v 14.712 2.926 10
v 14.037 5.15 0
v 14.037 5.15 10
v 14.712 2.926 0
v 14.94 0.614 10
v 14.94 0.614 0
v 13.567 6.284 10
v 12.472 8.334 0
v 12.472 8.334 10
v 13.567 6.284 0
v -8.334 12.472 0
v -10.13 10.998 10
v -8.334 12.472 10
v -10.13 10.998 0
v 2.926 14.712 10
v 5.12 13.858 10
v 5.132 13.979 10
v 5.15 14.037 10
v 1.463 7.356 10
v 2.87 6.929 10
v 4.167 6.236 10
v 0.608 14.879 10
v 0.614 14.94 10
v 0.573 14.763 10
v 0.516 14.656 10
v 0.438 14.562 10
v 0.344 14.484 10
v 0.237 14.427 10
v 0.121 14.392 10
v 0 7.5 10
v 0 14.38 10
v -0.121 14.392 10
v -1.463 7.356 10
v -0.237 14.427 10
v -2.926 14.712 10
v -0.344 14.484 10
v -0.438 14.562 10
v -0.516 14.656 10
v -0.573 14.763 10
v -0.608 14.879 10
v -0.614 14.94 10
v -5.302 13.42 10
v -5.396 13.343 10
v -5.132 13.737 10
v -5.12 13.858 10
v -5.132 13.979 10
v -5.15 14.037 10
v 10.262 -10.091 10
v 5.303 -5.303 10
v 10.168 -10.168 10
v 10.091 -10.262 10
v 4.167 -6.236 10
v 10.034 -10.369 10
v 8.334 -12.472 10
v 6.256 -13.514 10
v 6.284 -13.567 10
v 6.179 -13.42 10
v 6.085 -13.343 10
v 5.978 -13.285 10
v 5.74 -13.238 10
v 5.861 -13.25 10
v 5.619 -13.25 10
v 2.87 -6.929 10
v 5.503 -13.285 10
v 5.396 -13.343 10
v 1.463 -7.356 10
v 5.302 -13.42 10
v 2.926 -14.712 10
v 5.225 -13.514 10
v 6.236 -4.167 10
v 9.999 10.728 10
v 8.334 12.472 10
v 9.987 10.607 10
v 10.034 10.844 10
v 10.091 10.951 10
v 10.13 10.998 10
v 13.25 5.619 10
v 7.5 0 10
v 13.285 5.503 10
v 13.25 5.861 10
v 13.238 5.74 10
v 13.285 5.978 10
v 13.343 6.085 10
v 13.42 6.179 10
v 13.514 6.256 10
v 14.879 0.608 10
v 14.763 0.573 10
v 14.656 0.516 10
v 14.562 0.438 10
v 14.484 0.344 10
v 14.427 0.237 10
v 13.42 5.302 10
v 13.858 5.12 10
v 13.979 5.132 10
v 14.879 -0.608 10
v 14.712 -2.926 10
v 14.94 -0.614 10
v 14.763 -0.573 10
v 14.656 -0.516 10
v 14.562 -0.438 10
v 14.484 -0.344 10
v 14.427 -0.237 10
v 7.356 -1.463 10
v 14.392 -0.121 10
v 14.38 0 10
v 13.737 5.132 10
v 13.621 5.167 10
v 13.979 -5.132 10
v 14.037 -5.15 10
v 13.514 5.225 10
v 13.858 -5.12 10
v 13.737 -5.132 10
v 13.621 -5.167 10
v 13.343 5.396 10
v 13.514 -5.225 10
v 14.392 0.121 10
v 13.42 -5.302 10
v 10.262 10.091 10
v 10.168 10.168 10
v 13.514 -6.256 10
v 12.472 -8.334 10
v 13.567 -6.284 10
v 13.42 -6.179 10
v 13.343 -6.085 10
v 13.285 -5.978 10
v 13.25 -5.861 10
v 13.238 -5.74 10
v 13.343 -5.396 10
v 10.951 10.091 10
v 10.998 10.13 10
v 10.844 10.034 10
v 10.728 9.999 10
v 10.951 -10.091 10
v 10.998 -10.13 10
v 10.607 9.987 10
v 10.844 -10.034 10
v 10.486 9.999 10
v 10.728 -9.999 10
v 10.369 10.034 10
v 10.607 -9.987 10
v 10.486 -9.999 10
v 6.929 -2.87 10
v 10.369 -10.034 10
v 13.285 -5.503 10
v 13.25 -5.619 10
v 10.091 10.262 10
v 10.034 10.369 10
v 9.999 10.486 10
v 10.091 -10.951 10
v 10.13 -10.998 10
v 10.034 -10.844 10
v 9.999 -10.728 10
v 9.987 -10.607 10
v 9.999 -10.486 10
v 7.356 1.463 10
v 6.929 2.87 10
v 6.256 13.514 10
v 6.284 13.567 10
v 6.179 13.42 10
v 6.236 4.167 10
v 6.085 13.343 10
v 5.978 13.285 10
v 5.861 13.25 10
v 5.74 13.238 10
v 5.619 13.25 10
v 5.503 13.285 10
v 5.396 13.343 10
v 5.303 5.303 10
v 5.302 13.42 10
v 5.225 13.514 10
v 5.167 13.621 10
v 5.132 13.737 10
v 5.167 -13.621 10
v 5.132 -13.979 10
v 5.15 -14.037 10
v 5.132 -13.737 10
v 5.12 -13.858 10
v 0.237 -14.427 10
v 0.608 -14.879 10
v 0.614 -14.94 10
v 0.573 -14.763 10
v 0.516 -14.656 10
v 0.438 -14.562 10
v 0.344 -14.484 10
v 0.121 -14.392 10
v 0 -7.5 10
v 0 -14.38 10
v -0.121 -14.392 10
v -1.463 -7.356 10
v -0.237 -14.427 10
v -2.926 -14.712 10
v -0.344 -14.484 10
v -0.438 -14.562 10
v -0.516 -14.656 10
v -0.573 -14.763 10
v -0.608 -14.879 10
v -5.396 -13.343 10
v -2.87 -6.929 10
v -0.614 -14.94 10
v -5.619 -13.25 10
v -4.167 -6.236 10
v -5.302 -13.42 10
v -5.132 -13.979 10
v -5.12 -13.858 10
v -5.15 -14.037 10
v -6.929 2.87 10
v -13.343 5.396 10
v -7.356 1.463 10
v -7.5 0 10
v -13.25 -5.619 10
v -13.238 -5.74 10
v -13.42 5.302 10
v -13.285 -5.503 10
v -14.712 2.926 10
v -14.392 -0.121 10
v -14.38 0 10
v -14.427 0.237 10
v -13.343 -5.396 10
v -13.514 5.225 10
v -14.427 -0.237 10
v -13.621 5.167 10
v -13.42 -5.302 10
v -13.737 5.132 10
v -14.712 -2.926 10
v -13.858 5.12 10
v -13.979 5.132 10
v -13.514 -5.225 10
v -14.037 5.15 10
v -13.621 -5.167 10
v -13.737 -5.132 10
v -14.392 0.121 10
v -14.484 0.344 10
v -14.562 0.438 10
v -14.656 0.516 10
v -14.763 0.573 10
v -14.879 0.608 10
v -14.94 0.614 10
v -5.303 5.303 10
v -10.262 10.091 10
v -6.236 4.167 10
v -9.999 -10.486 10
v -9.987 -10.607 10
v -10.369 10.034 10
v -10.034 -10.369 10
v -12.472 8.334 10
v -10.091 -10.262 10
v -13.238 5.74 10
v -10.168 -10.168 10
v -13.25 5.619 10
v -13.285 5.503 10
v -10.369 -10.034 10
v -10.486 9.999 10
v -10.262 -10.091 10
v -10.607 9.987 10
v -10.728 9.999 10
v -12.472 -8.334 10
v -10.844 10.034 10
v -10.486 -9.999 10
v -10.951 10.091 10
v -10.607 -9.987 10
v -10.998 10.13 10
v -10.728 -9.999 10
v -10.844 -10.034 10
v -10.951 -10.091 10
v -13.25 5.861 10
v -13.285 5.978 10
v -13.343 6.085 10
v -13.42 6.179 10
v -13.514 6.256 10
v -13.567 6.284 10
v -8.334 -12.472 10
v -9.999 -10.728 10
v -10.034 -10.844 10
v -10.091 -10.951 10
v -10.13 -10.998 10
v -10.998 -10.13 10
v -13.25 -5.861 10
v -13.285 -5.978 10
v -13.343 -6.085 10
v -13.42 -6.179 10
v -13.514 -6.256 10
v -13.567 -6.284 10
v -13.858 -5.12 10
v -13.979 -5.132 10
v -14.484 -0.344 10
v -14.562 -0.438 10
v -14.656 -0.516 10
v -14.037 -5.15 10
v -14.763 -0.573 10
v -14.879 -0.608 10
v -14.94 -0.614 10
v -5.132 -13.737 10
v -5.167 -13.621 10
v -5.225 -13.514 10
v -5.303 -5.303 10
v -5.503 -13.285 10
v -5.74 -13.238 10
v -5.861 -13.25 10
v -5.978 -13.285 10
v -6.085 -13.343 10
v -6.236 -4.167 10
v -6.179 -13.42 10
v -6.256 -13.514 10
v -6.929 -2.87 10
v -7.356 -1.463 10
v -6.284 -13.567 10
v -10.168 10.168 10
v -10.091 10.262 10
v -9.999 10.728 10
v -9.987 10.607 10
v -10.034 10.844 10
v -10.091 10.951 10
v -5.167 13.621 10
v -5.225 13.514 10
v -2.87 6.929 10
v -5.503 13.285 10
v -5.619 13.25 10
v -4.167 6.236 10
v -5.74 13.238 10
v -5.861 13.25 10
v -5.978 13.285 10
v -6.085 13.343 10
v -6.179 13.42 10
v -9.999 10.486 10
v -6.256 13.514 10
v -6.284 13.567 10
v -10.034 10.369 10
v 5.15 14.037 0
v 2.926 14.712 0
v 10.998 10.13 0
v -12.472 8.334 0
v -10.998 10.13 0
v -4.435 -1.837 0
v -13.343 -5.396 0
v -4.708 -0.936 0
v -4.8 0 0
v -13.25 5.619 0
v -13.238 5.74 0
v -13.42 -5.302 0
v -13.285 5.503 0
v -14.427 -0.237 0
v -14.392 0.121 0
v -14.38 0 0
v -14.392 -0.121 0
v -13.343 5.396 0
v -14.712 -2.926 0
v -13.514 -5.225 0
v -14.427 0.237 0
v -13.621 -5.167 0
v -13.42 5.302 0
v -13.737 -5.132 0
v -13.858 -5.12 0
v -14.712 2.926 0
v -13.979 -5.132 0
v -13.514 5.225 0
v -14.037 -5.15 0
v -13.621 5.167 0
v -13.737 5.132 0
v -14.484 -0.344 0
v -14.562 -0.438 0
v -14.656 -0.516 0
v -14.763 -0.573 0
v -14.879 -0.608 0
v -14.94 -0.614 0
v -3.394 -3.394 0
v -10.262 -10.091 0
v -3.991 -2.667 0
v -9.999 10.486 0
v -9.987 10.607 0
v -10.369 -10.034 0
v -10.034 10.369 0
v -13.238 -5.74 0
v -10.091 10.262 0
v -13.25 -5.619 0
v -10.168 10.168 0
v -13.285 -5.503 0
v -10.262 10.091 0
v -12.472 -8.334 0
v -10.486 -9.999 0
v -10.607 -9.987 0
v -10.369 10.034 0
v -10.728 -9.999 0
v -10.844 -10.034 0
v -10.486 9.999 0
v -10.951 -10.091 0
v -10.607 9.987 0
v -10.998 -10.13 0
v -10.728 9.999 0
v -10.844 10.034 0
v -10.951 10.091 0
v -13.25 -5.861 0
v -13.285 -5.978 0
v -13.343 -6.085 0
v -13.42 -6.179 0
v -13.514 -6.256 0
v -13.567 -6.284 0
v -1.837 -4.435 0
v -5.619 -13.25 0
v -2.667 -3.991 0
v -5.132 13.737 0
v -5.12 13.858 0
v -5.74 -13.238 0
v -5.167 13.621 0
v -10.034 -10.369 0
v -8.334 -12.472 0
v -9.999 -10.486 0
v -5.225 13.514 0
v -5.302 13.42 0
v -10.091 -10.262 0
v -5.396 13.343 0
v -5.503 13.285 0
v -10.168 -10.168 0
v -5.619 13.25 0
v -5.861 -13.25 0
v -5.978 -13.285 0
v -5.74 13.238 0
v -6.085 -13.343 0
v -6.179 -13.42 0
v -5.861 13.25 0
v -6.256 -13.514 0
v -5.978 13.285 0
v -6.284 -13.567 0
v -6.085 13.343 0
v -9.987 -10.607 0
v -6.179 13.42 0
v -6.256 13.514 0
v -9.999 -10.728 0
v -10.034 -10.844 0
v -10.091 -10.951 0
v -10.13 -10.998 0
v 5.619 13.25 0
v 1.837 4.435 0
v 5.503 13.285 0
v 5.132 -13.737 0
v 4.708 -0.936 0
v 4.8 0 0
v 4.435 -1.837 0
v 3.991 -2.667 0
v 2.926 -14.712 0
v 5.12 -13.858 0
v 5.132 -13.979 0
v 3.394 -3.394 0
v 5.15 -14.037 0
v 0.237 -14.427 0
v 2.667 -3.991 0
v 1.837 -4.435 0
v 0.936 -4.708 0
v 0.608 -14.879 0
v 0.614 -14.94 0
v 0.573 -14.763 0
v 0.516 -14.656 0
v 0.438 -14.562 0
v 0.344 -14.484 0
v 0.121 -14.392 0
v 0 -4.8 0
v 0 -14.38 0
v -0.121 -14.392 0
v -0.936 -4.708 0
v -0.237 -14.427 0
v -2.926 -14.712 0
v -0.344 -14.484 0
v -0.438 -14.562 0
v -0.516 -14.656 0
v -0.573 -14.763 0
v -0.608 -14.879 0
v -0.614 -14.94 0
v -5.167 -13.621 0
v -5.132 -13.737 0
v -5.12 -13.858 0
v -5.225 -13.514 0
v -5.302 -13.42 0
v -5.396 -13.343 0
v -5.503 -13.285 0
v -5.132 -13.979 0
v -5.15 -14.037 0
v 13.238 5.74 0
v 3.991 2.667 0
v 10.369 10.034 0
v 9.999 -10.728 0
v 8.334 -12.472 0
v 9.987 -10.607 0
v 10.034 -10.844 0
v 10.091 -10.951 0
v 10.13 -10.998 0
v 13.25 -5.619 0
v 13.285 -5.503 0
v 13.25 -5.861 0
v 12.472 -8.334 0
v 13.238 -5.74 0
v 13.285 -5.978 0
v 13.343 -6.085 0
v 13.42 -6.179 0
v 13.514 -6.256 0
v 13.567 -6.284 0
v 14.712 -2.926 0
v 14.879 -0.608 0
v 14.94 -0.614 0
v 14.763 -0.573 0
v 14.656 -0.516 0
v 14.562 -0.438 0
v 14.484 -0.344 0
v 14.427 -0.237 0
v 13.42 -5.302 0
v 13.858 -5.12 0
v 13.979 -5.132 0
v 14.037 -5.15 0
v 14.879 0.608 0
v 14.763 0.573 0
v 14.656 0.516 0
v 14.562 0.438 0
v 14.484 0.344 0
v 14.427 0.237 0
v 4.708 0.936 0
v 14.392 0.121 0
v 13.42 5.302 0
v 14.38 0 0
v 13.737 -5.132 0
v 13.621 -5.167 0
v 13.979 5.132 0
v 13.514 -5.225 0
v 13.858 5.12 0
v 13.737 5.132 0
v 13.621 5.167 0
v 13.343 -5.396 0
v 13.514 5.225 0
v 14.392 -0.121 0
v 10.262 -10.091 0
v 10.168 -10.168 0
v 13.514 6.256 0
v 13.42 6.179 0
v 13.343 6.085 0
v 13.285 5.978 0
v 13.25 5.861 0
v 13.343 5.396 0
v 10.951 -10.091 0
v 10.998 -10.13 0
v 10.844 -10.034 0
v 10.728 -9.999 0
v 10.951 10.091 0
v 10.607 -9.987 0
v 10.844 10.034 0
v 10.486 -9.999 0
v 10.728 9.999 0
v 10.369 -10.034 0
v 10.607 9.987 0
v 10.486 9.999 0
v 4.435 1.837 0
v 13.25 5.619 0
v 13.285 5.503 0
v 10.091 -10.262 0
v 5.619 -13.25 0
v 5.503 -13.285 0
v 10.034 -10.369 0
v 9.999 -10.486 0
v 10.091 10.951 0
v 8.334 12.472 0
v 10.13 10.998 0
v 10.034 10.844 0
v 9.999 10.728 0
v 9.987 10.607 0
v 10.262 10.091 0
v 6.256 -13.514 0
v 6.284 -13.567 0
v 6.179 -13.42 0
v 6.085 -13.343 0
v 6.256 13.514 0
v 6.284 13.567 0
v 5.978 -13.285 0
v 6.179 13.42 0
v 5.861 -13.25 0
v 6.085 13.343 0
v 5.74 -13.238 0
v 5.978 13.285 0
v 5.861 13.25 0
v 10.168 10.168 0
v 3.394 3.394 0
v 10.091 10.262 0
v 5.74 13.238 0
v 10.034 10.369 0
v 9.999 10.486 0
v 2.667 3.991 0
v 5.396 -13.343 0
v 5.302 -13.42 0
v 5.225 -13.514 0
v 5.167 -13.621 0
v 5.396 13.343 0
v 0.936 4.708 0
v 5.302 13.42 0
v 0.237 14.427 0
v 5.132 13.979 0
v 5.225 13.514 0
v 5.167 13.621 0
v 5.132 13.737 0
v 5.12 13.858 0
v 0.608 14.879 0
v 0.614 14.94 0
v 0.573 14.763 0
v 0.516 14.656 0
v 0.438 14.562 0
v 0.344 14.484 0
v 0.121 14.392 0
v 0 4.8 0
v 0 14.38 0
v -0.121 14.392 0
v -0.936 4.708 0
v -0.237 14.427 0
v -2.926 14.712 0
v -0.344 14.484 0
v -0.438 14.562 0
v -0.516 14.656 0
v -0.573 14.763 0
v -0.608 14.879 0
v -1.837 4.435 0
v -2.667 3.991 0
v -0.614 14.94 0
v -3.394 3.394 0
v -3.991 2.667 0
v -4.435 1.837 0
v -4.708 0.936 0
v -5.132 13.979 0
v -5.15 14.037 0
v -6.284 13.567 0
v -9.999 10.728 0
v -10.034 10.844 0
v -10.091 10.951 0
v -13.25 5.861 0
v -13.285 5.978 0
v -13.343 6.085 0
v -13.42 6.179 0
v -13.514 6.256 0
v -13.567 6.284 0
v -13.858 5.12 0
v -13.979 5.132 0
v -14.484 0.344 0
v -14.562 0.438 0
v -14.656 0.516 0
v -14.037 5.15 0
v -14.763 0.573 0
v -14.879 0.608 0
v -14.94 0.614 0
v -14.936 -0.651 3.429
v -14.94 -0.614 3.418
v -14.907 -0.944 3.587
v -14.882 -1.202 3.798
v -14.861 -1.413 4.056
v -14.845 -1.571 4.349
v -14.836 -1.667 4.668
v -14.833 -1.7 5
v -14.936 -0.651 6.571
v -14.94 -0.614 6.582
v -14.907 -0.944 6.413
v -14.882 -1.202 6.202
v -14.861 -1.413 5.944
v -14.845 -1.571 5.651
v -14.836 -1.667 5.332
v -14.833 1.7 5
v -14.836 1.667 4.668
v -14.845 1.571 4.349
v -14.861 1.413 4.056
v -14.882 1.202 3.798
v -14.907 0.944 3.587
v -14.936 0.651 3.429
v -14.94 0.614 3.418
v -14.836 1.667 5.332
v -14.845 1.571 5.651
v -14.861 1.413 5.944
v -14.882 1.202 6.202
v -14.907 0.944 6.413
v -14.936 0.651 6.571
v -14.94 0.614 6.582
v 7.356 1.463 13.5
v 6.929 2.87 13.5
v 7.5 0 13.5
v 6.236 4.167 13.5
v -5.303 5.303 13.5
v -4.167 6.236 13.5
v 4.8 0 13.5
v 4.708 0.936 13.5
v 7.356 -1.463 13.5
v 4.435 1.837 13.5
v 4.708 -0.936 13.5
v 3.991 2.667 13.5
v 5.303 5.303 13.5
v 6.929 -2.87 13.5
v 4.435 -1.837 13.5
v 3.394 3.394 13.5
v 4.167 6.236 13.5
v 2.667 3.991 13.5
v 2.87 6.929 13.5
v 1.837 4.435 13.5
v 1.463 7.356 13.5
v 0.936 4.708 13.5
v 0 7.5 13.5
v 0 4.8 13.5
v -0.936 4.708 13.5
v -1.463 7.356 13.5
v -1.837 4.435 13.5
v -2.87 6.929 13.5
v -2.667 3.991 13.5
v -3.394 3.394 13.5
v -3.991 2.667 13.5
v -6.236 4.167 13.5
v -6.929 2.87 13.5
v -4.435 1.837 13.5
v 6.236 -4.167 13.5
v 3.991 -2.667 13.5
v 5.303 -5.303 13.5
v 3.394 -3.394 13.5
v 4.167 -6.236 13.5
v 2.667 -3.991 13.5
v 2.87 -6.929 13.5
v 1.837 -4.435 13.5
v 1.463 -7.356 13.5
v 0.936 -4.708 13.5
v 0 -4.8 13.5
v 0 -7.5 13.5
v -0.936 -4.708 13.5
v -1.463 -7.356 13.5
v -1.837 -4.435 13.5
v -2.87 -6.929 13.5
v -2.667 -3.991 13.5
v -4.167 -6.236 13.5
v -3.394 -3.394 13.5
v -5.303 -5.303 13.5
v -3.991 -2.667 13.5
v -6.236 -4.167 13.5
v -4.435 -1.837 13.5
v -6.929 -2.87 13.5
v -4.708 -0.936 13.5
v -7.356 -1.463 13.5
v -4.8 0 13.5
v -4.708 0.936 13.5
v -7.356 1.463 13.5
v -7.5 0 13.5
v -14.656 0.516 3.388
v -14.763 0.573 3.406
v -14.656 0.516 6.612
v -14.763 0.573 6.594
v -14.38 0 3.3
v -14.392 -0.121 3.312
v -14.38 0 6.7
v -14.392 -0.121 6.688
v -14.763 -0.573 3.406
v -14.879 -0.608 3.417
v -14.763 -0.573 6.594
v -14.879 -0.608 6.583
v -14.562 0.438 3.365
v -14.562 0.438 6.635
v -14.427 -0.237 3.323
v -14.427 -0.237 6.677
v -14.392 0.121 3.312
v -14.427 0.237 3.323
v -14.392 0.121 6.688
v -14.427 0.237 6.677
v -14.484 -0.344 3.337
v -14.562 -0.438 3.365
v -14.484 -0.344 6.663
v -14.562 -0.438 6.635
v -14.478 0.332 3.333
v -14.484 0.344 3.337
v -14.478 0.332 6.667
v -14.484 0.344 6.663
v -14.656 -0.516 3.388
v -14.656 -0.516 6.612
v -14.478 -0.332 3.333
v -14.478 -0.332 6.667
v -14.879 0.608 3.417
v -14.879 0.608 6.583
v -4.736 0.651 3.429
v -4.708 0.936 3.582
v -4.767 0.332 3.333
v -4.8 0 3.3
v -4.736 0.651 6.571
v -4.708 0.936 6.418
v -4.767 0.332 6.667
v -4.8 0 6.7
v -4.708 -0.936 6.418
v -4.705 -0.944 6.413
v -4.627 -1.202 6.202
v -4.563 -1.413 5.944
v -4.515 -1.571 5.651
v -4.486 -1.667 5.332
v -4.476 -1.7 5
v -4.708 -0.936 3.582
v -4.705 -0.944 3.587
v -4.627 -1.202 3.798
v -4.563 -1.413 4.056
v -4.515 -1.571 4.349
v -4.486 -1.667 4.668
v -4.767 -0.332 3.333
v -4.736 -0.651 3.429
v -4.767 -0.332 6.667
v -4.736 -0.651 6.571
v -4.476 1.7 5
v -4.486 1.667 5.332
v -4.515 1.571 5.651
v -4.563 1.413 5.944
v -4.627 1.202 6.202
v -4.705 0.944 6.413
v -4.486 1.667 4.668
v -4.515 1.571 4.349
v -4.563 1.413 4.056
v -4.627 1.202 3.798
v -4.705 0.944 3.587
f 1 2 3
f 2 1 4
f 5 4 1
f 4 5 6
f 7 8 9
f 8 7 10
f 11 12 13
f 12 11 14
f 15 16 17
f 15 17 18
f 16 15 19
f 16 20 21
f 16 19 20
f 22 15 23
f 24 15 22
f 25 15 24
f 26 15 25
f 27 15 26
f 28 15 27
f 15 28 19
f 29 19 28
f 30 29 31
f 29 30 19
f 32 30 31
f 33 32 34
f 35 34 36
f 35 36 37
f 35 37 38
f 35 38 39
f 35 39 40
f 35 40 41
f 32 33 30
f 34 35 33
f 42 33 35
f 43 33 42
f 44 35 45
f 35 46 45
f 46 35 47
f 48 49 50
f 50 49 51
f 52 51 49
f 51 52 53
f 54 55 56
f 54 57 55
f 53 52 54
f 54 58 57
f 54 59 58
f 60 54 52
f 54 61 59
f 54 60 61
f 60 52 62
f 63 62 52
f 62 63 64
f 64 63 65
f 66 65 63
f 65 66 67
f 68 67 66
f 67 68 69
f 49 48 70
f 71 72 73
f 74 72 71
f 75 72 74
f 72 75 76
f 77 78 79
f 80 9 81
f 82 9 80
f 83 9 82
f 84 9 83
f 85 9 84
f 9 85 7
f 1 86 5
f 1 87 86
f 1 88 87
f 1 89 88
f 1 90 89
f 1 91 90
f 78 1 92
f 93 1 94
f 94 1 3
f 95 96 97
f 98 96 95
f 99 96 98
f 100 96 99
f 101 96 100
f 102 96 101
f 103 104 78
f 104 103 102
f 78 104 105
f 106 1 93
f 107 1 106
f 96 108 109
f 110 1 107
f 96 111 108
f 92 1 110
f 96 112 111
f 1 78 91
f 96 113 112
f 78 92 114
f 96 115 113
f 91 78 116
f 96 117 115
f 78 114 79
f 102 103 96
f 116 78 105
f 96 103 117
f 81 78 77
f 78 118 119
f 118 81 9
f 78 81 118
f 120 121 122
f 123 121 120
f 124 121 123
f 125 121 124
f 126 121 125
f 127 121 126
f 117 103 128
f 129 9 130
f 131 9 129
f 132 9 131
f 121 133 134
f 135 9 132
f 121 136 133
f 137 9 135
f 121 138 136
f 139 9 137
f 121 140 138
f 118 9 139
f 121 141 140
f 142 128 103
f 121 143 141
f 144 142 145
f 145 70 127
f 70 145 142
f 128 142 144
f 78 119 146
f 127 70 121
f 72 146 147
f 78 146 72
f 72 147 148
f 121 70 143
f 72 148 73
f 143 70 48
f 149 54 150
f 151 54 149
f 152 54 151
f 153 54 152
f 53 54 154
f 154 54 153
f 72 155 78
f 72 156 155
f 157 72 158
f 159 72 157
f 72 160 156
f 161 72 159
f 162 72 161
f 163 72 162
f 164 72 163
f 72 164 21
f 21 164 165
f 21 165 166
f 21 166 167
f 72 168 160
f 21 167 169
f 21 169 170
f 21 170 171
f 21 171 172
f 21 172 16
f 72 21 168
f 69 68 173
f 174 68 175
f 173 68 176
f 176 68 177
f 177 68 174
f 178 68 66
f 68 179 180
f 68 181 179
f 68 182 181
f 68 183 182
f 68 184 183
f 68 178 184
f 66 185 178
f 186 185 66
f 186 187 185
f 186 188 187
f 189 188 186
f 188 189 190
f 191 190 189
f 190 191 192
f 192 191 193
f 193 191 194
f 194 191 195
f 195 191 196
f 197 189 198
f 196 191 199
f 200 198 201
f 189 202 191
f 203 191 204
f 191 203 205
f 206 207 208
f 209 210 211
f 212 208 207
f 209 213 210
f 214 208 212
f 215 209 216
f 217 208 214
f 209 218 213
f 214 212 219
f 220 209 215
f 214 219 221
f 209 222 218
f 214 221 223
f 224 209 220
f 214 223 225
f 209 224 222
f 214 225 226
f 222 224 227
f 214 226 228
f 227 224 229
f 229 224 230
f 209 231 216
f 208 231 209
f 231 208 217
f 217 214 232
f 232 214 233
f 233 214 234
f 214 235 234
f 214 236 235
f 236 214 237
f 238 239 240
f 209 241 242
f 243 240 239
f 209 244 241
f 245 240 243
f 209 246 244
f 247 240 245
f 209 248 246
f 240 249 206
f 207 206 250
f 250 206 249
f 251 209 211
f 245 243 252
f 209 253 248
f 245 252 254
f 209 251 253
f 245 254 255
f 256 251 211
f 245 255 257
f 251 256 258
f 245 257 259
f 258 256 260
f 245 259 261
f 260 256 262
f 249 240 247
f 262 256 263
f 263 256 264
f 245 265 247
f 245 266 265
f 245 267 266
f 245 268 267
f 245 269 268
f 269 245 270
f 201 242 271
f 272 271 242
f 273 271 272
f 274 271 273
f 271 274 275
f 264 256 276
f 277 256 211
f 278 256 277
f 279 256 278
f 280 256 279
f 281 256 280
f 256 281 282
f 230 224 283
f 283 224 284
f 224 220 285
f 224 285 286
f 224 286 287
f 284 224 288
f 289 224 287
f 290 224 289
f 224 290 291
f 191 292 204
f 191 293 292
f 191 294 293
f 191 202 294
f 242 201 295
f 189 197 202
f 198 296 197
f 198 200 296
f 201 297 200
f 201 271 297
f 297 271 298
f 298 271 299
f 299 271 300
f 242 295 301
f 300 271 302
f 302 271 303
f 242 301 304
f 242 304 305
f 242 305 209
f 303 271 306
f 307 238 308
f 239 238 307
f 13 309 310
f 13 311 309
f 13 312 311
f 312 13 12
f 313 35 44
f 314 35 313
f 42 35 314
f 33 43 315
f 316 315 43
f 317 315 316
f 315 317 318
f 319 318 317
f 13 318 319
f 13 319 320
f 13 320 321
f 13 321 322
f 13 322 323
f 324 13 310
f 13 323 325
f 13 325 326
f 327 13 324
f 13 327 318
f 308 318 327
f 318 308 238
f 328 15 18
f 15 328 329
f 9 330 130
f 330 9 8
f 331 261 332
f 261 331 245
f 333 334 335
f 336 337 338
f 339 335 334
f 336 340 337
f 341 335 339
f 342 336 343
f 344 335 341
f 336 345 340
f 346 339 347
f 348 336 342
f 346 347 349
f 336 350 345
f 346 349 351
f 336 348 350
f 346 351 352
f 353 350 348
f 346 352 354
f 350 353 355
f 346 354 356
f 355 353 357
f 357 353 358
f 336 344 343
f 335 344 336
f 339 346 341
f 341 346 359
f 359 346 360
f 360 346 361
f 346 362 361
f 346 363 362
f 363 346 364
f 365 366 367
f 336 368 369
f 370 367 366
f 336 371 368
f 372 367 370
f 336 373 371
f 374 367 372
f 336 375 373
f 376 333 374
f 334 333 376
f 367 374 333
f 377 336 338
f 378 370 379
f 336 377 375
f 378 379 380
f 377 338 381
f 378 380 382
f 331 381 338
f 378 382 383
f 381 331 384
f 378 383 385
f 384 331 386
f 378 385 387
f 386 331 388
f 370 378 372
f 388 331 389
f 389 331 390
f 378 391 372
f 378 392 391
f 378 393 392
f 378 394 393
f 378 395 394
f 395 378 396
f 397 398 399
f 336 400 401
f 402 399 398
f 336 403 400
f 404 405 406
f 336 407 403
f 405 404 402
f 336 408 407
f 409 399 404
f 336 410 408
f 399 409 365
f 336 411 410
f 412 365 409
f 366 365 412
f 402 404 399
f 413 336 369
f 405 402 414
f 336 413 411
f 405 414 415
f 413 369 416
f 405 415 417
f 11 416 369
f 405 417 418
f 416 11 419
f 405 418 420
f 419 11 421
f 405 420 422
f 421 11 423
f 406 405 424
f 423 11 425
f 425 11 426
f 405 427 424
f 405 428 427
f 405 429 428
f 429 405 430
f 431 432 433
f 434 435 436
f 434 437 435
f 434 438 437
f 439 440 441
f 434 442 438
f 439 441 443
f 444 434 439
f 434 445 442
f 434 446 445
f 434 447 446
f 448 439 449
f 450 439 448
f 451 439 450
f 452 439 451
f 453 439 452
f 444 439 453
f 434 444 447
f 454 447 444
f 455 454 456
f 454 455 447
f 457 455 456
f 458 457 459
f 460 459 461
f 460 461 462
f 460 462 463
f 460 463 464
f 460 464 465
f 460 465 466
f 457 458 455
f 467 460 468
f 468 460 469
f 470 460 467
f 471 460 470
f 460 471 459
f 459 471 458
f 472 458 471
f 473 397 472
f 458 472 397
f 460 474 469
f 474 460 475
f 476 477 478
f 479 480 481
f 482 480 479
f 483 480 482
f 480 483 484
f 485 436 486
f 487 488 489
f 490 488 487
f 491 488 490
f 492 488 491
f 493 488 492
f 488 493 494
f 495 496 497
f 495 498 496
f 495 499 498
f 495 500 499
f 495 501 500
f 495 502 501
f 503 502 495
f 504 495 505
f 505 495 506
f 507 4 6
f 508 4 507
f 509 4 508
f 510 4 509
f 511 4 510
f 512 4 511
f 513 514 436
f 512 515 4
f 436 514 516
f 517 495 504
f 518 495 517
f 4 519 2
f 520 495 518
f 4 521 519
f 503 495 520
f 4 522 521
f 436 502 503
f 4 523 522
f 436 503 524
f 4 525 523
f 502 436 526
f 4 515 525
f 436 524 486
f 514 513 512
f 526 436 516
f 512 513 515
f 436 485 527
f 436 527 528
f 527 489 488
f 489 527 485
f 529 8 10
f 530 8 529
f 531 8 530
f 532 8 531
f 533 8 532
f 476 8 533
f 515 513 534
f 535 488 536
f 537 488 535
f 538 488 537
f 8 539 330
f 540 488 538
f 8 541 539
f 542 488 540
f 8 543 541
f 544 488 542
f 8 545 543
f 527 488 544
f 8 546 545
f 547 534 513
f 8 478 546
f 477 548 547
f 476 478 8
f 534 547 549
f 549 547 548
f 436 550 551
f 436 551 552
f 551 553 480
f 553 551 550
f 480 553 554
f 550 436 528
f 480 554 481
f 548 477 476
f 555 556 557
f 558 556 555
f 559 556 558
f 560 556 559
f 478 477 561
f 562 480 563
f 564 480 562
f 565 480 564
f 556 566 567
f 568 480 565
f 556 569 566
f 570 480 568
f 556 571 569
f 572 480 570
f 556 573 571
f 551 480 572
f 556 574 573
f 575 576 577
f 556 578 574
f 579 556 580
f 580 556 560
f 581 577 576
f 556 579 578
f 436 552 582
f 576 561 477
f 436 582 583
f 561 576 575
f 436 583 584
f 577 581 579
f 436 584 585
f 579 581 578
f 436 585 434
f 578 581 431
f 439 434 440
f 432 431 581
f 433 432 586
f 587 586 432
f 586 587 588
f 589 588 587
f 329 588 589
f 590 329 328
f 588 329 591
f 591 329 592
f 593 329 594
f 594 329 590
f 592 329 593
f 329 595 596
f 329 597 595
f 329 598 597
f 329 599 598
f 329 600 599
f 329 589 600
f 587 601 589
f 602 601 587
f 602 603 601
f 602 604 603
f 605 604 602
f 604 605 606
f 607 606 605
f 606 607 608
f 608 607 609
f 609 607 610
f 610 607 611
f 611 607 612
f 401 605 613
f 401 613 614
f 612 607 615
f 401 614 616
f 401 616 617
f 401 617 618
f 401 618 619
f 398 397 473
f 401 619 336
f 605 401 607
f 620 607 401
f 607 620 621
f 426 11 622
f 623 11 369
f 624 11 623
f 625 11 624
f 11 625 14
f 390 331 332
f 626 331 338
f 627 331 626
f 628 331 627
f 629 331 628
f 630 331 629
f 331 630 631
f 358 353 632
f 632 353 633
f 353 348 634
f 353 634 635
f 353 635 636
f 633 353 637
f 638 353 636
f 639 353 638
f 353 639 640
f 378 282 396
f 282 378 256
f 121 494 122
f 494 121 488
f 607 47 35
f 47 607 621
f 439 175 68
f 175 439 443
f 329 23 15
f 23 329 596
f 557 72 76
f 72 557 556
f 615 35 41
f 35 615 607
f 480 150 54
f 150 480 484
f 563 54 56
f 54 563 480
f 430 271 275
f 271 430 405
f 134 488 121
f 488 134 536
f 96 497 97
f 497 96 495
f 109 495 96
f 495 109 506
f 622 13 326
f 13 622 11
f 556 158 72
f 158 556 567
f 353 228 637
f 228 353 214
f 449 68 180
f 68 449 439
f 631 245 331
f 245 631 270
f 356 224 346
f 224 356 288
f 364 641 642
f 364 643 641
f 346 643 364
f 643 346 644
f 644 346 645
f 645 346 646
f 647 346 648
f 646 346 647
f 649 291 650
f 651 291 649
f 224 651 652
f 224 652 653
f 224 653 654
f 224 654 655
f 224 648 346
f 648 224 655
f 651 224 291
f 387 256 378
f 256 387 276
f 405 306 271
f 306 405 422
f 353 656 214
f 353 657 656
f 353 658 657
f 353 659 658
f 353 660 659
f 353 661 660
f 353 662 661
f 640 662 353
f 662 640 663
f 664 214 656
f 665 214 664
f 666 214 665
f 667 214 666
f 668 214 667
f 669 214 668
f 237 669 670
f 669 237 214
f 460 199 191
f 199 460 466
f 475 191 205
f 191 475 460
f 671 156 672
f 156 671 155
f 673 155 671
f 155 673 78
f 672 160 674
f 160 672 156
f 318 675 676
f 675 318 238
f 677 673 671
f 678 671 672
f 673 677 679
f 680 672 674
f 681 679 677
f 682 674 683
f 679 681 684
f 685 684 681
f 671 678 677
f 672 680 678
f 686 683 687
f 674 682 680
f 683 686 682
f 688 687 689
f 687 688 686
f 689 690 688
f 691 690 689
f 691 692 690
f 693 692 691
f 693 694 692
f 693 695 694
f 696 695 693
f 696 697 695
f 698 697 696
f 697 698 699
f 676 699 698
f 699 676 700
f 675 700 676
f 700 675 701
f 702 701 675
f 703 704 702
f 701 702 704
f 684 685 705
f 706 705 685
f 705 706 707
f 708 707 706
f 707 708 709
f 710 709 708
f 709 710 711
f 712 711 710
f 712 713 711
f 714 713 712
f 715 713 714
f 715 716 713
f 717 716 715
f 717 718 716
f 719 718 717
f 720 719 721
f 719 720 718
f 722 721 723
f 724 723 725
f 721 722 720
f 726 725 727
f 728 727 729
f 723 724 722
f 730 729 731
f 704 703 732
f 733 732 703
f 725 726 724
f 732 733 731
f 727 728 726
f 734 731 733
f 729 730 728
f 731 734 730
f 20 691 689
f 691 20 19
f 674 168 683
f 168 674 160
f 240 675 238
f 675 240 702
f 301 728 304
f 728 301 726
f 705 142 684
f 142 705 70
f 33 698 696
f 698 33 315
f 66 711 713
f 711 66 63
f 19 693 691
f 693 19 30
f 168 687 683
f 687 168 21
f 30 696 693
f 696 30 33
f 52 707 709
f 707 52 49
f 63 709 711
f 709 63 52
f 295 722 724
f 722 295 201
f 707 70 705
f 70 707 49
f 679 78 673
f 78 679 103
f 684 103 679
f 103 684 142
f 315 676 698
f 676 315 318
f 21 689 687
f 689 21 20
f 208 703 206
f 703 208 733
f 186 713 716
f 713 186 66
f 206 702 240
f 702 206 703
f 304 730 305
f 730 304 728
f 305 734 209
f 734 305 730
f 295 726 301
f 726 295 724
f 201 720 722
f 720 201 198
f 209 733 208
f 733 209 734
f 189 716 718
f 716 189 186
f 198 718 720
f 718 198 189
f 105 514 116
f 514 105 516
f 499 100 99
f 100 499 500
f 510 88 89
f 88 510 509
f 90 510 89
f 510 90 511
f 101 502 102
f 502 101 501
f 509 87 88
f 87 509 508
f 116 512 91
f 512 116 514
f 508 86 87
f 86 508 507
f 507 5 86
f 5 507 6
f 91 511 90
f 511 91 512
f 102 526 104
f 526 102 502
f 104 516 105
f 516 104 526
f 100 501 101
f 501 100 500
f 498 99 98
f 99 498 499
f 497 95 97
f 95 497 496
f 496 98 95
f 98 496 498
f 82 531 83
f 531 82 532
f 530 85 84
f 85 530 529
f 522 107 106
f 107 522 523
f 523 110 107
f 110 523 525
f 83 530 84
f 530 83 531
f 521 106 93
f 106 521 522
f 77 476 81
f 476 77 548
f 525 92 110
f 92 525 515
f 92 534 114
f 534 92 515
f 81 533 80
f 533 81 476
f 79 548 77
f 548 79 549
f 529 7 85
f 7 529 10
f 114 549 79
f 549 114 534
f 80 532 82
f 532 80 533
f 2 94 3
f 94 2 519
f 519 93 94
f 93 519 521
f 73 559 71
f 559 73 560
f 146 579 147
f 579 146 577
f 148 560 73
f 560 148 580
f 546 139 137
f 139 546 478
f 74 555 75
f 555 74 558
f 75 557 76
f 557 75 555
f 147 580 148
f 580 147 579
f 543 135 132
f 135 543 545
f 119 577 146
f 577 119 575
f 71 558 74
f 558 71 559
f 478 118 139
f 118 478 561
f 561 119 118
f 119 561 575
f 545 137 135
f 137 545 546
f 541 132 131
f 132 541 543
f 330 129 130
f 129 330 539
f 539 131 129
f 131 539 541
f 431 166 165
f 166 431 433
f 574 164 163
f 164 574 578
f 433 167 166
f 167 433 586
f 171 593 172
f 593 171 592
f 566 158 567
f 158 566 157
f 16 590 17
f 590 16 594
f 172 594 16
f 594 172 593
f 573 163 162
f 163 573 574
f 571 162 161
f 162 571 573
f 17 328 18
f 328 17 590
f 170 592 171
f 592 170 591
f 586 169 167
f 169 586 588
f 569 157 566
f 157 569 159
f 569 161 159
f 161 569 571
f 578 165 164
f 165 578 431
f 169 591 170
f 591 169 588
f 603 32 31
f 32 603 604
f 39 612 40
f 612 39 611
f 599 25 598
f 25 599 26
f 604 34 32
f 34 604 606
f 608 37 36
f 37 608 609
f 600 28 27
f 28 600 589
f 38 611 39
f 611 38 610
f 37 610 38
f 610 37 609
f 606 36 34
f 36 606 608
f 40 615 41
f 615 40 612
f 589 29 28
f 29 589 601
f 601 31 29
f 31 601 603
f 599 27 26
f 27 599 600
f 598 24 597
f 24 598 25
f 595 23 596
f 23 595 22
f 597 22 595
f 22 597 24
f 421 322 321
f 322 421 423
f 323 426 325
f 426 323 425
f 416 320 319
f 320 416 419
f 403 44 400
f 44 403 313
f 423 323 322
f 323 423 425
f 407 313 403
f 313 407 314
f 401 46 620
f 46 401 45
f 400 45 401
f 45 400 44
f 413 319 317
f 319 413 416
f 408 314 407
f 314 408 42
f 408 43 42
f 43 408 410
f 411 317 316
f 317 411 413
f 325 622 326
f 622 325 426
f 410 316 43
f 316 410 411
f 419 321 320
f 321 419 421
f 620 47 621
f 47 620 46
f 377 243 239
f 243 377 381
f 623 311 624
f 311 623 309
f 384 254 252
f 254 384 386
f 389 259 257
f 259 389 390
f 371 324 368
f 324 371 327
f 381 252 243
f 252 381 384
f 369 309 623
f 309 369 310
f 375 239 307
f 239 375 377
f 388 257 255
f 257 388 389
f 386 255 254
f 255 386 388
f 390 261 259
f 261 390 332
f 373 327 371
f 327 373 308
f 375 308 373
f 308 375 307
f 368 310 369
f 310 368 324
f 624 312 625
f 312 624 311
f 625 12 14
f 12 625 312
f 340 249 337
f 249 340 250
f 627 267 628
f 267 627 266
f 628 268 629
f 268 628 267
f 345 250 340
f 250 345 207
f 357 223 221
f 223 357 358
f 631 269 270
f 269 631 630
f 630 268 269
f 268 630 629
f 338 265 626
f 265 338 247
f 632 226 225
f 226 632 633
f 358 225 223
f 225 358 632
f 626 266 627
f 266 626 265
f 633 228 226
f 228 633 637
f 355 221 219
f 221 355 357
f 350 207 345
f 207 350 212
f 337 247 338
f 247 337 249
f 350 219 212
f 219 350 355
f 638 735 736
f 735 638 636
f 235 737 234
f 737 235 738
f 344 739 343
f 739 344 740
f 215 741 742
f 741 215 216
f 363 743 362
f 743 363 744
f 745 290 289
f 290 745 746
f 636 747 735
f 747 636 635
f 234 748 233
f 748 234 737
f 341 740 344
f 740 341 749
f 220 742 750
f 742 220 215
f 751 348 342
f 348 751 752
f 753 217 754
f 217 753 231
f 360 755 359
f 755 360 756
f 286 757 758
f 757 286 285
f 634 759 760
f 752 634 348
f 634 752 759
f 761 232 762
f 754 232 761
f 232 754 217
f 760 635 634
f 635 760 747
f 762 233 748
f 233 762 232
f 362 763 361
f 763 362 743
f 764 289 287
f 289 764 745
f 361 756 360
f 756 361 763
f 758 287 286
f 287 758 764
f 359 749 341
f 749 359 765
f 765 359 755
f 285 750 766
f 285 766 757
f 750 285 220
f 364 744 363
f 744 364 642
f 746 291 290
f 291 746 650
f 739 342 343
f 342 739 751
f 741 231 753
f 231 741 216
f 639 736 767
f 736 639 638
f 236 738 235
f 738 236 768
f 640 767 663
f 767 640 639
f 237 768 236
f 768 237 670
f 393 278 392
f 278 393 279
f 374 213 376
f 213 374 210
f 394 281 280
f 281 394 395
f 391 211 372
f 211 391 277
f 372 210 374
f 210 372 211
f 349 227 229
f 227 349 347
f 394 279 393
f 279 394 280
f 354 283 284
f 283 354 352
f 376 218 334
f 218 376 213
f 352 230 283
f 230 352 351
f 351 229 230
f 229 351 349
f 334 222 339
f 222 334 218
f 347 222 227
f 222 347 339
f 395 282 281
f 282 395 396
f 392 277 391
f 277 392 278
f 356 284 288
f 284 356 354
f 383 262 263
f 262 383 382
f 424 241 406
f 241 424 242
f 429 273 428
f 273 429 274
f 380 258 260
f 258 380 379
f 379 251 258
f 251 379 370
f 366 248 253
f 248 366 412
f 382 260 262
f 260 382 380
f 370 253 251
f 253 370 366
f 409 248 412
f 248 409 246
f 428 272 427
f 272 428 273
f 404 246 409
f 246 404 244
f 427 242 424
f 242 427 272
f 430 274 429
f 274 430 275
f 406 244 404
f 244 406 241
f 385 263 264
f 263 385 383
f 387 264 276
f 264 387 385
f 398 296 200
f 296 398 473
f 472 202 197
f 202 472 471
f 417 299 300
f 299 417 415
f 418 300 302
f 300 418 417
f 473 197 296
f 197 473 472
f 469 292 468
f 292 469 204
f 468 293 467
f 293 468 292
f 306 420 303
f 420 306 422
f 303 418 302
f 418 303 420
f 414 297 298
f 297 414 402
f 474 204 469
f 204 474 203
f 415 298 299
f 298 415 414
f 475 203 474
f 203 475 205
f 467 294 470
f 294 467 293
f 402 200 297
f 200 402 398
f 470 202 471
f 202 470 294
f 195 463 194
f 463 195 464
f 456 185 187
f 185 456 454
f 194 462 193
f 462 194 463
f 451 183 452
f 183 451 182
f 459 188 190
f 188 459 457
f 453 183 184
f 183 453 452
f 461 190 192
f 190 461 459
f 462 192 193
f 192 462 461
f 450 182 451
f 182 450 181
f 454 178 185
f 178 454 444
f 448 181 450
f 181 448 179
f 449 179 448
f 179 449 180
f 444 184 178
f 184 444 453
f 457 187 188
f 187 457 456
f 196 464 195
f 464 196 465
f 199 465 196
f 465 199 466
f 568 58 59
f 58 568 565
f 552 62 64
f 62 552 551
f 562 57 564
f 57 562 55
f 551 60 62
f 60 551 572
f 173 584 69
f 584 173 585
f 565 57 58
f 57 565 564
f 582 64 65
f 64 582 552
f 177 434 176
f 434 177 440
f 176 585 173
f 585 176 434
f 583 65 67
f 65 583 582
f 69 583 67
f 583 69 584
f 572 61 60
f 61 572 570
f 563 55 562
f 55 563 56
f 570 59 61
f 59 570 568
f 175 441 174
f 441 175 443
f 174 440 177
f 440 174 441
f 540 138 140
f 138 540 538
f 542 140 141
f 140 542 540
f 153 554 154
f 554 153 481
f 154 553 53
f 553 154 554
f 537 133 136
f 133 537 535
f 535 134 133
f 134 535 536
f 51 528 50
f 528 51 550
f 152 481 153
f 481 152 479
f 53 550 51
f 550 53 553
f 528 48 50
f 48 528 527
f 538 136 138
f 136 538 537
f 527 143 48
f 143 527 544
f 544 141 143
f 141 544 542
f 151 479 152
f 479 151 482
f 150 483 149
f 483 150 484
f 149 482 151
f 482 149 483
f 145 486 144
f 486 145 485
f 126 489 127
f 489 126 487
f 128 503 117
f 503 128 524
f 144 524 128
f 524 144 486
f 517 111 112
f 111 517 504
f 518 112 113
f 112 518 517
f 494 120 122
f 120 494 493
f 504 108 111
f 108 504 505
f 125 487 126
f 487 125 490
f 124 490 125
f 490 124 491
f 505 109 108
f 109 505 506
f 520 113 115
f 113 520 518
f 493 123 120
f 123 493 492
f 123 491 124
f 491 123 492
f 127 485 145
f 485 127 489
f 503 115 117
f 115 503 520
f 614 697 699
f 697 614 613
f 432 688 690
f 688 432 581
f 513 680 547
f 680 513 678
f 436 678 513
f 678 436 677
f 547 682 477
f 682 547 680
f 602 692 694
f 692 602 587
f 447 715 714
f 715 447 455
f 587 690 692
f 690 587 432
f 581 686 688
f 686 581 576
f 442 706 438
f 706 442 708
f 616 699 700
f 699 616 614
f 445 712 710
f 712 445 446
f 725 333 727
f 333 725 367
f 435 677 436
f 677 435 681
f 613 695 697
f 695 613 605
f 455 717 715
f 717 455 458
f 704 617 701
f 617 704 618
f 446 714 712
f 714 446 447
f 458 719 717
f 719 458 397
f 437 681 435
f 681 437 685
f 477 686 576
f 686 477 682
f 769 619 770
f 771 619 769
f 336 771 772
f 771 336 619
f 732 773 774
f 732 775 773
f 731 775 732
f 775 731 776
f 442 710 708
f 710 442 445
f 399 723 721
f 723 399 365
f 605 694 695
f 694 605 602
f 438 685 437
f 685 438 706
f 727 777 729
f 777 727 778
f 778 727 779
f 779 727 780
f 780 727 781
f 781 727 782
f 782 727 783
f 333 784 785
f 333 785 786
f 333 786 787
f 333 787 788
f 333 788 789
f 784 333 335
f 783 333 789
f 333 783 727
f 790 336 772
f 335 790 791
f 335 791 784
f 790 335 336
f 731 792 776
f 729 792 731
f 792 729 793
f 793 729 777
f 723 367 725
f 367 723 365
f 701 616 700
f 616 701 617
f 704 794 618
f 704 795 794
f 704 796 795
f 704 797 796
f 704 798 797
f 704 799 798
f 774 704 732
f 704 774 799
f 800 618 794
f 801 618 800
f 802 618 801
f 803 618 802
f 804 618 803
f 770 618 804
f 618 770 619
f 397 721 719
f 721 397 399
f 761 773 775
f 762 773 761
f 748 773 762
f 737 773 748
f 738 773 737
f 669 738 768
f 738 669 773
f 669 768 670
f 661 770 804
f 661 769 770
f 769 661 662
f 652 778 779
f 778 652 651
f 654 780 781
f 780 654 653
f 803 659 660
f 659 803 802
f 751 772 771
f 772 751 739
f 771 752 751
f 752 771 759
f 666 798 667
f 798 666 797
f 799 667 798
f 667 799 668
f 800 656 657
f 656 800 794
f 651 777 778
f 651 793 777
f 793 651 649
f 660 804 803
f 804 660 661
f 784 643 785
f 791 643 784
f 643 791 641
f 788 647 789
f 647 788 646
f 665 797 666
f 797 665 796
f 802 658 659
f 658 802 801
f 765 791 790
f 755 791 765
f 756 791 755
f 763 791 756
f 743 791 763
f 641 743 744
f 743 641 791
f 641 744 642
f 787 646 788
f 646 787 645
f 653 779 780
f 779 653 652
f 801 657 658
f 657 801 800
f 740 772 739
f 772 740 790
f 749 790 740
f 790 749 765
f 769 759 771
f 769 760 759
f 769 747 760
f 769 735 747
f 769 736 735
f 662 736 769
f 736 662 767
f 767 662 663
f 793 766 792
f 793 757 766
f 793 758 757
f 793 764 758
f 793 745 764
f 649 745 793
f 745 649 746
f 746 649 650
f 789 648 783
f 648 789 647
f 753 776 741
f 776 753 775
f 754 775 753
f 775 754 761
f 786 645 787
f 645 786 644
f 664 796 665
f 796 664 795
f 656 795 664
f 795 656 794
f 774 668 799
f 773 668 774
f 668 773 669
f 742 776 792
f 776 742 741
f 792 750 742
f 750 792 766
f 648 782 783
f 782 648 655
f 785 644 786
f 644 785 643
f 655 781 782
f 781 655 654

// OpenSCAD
$fn = 32;

// ----------------------------------------------------------------------
// Hand knob: 30 x 30 x 13.5 mm
// ----------------------------------------------------------------------

// --- parameters (mm) ---
head_d = 30;              // knob diameter
head_h = 10;              // knob height
hole_d = 9.6;             // shaft bore
set_d = 3.4;              // set screw tap hole
notch_d = 1.24;           // knurl groove diameter
knurl_n = 16;             // number of knurl grooves
cap_h = 3.5;              // raised centre cap
cap_d = 15;               // centre cap diameter

module body() {
  cylinder(h = head_h, d = head_d);
}

module cap() {
  translate([0, 0, head_h - 1]) cylinder(h = cap_h + 1, d = cap_d);
}

difference() {
  union() {
    body();
    cap();
  }
  translate([0, 0, -1]) cylinder(h = head_h + cap_h + 2, d = hole_d);
  /* knurl grooves */
  for (i = [0 : knurl_n - 1])
    rotate([0, 0, i * 360 / knurl_n])
      translate([head_d / 2, 0, -0.5])
        cylinder(h = head_h + 1, d = notch_d);
  translate([-head_d / 2 - 1, 0, head_h * 0.5]) rotate([0, 90, 0]) cylinder(h = head_d / 2 + 2, d = set_d);
}
